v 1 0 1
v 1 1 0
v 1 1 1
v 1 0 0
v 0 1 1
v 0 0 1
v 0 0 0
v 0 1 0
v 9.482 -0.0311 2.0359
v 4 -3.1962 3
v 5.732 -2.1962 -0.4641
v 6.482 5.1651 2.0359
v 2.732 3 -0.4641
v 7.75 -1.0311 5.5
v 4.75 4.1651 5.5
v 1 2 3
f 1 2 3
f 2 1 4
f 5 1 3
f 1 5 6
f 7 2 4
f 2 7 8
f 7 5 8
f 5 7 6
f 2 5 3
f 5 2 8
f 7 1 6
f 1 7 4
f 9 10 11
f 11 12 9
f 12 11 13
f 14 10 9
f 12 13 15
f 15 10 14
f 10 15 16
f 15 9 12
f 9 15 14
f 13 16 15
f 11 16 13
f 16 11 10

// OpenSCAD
cube();
translate([1, 2, 3]) {
    rotate([90, 60, 30]) {
        scale([4, 5, 6]) {
            cube();
        }
    }
}
